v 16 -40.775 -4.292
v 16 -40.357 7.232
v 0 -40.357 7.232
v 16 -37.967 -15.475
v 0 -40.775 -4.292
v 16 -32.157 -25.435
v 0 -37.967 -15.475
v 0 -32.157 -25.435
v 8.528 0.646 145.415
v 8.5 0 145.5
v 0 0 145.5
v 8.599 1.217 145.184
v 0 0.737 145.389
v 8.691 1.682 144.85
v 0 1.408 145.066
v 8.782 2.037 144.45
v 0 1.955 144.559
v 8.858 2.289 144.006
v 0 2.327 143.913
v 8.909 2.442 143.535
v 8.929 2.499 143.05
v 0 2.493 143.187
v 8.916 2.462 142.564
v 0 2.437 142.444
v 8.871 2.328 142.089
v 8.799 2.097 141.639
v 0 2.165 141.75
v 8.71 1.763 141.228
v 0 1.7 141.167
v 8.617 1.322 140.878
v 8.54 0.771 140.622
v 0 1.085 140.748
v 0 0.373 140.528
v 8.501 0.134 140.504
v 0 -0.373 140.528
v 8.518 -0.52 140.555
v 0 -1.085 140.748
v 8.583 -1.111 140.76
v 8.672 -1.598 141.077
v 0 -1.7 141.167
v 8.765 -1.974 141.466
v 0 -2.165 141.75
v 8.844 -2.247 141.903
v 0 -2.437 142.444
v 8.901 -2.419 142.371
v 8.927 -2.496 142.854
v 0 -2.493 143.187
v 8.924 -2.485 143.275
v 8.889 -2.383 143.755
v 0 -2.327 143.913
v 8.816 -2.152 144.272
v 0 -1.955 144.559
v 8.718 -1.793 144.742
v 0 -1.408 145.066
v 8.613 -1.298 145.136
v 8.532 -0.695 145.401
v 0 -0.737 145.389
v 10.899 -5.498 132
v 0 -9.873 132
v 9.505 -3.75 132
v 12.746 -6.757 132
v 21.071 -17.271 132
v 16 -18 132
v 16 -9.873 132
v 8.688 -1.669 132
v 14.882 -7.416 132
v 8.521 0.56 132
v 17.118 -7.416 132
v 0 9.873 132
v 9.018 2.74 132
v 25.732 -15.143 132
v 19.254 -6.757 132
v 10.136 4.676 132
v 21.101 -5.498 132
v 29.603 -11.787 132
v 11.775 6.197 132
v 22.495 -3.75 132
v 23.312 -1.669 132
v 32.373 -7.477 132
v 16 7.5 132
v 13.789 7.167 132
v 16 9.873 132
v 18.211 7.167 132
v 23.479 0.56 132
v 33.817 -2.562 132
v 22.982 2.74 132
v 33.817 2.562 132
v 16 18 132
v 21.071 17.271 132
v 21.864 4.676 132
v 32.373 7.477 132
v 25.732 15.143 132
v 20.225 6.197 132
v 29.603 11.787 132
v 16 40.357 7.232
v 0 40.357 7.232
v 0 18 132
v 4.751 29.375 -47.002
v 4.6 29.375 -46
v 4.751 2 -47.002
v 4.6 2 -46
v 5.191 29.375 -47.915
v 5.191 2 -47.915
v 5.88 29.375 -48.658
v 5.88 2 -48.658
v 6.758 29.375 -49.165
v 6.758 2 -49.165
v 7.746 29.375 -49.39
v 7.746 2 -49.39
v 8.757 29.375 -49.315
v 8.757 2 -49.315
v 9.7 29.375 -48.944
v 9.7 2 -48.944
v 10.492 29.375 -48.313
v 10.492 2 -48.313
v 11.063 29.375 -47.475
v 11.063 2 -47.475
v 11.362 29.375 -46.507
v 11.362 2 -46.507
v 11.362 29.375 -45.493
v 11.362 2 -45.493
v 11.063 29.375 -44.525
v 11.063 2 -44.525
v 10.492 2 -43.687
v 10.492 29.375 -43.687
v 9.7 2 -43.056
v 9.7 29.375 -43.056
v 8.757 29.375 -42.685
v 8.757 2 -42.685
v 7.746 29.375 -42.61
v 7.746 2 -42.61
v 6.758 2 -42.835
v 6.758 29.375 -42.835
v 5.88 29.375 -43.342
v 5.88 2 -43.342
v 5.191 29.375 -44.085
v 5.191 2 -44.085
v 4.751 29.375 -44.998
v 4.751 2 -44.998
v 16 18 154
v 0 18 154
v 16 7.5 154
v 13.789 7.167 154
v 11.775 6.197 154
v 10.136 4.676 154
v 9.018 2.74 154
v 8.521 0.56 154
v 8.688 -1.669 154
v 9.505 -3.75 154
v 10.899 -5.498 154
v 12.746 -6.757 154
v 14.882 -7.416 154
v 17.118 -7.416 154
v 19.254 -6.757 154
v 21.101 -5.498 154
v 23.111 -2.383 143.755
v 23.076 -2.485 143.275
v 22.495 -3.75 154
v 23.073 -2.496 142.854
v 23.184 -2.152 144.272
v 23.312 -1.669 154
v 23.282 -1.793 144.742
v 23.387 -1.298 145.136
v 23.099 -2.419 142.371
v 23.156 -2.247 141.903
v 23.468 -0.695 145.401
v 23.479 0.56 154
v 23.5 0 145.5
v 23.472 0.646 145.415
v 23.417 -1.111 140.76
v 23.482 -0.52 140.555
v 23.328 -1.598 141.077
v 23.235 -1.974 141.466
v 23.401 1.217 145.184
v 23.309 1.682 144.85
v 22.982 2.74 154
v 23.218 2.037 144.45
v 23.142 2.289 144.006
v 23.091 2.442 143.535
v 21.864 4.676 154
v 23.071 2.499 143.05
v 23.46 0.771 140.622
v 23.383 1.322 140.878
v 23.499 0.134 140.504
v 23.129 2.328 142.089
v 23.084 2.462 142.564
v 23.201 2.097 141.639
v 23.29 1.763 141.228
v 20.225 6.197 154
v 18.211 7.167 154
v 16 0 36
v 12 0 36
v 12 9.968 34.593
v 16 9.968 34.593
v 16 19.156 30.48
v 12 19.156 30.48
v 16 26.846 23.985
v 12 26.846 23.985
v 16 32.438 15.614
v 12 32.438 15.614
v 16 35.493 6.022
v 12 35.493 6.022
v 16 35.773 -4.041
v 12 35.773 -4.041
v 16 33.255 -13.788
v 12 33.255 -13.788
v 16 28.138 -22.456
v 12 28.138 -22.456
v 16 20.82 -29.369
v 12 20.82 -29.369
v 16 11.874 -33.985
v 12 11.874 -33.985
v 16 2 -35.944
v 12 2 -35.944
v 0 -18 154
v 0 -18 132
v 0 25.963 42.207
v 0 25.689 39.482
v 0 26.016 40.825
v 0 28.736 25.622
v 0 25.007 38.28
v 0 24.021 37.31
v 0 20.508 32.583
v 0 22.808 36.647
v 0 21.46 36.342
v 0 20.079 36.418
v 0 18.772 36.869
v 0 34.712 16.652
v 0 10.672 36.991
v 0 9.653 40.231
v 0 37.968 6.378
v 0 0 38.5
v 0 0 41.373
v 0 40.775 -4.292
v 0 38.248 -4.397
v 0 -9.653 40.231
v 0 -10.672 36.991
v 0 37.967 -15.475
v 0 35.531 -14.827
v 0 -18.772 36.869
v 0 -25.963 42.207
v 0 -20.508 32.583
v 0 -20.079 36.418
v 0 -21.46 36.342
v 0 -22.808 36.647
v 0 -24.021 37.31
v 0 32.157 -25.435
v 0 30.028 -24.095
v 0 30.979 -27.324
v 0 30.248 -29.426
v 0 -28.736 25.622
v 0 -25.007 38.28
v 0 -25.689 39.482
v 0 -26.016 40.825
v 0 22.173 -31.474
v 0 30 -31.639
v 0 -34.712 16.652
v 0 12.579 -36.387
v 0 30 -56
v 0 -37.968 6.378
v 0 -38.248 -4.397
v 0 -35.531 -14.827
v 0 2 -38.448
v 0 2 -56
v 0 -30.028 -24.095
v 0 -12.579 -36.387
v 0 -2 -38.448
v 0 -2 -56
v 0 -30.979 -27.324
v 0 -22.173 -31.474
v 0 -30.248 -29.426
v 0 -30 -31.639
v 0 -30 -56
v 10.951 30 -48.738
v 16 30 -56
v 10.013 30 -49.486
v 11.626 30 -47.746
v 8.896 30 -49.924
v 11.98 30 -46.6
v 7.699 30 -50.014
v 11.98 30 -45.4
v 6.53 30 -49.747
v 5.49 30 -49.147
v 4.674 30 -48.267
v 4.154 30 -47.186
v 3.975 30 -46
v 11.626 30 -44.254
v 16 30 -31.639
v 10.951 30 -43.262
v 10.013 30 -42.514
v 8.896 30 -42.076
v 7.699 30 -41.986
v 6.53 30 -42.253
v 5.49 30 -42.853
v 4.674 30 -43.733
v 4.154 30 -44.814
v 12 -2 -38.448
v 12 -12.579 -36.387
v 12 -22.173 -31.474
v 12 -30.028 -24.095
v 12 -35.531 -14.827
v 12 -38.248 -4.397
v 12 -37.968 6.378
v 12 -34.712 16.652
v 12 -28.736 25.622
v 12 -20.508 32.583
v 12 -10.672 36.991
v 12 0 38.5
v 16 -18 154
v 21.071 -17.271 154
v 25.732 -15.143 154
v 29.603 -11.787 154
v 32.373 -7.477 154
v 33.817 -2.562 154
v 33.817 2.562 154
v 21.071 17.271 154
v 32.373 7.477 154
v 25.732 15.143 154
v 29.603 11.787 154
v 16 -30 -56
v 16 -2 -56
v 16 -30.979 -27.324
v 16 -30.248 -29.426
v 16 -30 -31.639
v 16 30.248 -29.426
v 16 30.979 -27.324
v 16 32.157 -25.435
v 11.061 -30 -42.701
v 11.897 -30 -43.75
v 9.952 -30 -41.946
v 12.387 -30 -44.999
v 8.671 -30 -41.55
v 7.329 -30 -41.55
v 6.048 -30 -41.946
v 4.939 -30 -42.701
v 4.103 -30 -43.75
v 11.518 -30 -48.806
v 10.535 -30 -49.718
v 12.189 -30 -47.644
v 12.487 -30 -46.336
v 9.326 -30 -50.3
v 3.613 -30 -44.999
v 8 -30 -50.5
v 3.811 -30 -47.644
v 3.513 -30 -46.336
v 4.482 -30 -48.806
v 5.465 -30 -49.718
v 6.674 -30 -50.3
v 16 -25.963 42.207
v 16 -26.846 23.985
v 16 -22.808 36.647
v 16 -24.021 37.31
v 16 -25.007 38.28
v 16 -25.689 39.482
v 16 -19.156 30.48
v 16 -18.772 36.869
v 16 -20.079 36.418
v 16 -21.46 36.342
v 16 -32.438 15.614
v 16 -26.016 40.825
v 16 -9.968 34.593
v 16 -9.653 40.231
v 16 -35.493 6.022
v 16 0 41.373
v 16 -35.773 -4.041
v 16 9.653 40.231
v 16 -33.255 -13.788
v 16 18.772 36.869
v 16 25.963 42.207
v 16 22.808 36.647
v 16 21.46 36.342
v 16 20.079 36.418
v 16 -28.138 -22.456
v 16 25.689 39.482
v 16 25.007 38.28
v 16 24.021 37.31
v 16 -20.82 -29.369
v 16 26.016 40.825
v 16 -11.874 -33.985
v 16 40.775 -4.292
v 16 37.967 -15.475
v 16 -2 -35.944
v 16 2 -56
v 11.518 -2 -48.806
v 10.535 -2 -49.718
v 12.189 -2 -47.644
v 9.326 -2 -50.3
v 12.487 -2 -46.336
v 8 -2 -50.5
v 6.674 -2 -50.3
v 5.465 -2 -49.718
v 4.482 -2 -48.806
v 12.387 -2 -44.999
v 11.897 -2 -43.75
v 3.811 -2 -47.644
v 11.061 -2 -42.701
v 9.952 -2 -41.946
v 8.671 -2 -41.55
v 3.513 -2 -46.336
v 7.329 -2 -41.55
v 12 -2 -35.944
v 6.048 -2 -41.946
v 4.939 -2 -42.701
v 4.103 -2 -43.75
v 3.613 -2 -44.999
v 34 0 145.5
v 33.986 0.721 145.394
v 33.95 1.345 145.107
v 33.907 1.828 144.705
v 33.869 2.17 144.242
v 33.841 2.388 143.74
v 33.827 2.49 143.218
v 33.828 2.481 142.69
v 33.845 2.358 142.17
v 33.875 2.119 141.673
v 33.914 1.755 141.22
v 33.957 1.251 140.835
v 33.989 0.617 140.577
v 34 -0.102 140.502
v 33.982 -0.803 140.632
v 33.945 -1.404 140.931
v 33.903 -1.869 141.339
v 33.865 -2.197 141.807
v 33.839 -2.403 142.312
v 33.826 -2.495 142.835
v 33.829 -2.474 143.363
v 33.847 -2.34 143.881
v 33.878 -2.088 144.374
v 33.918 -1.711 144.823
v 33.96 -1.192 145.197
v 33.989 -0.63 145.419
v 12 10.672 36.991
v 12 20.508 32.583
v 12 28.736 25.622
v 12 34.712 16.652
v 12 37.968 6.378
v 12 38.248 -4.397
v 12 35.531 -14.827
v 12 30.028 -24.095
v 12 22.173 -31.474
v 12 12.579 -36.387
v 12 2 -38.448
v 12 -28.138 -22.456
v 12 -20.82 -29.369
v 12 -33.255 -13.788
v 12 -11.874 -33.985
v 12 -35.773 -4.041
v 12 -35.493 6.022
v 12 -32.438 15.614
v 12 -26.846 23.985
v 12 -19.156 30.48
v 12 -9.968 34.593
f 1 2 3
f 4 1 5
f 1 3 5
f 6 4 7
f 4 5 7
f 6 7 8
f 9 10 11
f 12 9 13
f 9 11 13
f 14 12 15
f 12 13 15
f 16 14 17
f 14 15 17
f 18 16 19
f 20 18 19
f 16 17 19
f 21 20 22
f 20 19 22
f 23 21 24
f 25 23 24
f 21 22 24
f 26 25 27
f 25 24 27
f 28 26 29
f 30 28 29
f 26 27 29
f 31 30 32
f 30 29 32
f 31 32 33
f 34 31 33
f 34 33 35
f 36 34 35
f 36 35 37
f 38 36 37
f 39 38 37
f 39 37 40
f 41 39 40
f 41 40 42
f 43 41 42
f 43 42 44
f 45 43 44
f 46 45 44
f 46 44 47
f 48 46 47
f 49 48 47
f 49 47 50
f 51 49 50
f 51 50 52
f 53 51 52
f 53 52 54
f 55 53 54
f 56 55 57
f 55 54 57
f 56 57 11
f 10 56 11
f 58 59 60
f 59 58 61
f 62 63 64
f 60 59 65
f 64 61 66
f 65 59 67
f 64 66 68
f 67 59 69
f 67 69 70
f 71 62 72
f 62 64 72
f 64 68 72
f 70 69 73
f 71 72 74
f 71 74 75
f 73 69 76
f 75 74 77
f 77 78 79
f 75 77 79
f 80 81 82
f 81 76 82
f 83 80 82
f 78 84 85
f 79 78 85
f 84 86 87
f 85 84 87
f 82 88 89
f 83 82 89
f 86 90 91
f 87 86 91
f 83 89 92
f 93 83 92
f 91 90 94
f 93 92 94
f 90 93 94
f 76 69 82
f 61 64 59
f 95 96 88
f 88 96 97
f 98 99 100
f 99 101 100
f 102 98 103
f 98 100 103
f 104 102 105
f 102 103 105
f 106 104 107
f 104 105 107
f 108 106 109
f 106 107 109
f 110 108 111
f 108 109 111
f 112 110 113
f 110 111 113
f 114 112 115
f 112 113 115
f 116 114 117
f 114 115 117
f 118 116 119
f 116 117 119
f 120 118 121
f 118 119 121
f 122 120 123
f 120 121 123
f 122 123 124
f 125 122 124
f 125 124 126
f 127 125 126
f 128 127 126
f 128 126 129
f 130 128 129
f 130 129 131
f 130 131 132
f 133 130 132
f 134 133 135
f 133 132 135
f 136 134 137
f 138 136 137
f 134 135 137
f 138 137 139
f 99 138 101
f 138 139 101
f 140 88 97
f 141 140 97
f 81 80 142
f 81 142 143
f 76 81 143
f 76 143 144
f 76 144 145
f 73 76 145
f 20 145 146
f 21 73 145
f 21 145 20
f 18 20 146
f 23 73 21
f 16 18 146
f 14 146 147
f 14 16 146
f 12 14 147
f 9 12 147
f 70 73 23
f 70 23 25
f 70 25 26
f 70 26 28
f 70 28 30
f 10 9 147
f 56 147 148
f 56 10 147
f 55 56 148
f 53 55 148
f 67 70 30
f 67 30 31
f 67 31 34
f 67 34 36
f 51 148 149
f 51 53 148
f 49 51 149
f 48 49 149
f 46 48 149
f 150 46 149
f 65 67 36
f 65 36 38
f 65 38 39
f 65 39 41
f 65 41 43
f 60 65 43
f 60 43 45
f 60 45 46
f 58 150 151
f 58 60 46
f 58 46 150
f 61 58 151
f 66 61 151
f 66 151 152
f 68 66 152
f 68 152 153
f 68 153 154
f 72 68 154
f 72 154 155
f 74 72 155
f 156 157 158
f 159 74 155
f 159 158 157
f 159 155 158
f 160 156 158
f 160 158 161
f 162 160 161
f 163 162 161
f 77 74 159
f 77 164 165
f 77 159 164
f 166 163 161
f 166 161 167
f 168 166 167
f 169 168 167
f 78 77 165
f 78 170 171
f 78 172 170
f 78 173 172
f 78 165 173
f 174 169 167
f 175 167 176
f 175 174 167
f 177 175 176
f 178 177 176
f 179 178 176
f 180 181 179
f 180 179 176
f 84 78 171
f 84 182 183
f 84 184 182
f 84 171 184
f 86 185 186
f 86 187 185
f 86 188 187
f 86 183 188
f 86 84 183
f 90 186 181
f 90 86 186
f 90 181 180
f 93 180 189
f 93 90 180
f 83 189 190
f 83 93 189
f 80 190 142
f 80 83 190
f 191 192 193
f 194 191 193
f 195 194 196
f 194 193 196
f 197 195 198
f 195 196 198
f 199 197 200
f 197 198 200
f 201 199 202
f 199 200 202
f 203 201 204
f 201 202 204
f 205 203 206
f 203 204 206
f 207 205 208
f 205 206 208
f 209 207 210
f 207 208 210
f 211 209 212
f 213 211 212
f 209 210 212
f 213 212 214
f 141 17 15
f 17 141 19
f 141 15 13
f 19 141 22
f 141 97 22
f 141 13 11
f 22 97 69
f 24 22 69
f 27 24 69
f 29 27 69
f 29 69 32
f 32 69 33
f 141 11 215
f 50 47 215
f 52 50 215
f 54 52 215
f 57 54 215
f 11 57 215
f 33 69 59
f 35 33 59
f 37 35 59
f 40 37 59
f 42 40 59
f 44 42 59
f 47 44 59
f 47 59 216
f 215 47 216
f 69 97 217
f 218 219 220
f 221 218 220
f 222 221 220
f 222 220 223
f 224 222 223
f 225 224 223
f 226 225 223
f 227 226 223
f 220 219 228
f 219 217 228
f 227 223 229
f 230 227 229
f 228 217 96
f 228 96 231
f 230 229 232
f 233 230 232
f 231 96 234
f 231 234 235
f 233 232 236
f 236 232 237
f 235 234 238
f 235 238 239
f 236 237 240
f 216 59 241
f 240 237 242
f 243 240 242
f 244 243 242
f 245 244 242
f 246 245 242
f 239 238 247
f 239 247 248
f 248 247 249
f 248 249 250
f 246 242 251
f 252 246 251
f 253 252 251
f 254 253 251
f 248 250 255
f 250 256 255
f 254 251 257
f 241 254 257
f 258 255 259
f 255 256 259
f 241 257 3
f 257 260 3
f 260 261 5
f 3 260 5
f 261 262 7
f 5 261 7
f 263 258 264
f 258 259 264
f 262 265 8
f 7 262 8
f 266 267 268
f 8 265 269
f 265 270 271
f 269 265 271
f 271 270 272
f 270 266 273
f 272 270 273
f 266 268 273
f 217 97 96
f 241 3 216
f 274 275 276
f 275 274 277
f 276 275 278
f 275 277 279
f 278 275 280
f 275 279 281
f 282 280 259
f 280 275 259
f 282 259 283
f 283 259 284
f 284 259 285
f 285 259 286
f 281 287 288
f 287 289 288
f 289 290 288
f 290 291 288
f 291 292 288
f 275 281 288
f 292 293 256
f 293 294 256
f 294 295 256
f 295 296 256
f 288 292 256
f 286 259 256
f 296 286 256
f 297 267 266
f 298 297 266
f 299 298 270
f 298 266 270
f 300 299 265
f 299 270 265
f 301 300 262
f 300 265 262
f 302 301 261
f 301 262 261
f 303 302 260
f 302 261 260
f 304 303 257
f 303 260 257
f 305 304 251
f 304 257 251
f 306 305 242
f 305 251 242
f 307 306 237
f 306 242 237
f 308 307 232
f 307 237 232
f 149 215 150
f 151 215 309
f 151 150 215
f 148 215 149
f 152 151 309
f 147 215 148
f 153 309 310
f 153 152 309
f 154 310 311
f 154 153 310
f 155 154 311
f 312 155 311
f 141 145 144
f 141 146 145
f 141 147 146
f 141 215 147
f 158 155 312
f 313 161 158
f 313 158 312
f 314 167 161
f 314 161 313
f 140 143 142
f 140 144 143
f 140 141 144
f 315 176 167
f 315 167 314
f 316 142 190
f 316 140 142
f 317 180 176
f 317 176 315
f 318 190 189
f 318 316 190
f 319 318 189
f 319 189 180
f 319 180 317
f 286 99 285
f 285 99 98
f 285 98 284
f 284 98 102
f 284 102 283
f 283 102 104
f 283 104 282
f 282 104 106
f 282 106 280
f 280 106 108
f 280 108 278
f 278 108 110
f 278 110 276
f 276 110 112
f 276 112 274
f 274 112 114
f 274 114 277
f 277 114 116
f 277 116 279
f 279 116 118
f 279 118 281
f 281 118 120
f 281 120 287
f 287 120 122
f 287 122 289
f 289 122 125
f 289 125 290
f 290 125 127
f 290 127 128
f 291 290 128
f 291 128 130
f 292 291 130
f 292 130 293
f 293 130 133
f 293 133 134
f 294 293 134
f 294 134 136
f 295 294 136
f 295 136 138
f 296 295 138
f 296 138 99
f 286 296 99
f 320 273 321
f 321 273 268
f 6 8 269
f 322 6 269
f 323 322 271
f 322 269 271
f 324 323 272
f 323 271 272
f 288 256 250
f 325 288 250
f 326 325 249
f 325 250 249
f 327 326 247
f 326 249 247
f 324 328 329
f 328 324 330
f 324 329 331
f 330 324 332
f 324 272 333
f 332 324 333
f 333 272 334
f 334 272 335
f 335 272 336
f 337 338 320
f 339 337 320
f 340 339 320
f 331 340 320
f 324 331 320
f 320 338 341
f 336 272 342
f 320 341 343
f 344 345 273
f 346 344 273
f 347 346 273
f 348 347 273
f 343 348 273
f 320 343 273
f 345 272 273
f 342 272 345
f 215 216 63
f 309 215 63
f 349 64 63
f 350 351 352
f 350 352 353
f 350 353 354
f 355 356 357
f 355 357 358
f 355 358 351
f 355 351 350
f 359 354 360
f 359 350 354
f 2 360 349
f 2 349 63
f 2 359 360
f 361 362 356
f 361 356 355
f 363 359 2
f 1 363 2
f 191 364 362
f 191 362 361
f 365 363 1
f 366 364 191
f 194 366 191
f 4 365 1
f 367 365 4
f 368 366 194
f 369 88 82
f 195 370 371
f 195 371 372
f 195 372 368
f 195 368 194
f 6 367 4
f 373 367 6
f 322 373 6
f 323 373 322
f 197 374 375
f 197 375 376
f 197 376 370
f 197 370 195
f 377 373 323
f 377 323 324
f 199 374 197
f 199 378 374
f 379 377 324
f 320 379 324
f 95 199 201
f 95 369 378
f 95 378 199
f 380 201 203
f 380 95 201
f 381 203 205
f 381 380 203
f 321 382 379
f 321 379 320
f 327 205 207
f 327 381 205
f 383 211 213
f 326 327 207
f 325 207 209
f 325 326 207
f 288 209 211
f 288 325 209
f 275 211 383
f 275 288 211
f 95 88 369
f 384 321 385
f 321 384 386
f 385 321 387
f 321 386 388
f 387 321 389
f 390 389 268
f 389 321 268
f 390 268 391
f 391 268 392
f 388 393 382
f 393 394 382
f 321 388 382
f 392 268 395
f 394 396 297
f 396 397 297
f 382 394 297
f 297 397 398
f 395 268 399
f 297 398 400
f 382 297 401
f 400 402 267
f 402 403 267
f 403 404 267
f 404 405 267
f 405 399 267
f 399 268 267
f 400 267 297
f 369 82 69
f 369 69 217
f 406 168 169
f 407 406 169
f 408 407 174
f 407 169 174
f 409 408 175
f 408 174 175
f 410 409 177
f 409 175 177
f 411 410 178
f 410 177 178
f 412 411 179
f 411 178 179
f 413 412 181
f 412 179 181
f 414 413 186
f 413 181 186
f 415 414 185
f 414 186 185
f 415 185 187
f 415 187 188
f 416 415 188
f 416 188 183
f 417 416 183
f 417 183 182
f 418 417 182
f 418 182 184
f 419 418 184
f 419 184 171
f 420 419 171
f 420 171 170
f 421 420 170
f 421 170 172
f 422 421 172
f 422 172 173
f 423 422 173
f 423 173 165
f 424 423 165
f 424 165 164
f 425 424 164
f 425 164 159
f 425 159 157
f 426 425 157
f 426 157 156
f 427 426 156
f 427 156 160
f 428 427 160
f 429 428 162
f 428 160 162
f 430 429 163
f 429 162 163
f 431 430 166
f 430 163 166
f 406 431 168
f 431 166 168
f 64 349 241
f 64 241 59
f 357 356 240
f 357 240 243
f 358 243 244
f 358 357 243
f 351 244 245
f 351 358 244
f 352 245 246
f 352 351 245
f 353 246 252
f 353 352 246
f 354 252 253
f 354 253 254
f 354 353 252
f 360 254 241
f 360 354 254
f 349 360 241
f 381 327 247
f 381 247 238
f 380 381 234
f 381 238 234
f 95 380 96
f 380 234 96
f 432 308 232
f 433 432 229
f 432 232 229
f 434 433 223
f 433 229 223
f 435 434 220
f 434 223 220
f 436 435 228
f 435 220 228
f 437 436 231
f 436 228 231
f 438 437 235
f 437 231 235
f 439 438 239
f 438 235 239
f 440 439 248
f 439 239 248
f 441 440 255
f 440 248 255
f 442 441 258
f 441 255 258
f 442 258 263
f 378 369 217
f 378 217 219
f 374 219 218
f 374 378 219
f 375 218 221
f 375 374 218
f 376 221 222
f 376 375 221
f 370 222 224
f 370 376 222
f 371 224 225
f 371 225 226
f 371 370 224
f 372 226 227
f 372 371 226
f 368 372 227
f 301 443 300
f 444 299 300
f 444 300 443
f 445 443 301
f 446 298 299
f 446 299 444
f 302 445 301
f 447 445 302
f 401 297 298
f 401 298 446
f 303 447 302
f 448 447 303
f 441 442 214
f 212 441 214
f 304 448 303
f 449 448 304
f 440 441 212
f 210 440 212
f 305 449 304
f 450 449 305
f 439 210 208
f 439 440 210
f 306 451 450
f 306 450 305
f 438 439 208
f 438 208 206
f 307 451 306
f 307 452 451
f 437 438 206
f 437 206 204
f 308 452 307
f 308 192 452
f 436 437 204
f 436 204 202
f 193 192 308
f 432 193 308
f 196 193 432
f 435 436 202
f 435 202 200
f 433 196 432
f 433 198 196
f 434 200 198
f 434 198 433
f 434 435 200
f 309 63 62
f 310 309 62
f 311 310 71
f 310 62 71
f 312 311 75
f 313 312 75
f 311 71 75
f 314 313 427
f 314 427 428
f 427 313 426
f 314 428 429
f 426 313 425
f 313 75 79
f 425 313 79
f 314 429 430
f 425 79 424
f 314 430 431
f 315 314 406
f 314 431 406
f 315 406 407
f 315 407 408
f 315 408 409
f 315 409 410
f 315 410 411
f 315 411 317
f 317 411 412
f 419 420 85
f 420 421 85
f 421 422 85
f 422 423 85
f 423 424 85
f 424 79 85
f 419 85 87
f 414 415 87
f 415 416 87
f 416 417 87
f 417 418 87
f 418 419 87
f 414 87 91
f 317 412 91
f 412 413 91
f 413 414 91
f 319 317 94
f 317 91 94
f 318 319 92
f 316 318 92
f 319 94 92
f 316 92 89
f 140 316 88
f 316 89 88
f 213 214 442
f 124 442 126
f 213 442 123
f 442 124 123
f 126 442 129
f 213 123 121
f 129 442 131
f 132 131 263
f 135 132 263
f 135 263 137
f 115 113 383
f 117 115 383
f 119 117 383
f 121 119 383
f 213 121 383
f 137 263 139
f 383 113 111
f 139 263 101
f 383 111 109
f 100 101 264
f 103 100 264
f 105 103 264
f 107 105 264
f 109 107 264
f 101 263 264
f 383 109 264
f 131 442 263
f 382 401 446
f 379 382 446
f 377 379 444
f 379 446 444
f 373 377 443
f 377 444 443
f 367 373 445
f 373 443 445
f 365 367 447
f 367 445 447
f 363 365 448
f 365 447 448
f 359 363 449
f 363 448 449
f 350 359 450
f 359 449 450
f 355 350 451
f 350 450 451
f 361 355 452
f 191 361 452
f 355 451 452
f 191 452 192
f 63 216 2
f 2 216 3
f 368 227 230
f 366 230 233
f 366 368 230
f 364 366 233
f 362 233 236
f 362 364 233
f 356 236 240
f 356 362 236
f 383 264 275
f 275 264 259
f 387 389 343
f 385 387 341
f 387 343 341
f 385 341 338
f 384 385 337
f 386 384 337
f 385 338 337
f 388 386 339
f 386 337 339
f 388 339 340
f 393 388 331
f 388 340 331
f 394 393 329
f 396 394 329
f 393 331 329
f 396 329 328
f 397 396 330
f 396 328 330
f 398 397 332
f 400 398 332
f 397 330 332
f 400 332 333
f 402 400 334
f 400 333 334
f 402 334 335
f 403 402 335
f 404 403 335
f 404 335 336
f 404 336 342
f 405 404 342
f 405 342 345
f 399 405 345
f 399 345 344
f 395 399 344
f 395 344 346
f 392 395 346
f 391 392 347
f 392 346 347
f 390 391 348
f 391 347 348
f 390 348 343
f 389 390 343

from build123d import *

# Parameters (mm, degrees)
EXTRUDE_1_DEPTH              = 16
SKETCH_3_R                   = 7.5
EXTRUDE_2_DEPTH              = 22
SKETCH_4_R                   = 38.5
CUT_EXTRUDE_1_DEPTH          = 12
CUT_EXTRUDE_2_DEPTH          = 16
CUT_EXTRUDE_3_REACH          = 164.951
CUT_EXTRUDE_3_END_RADIUS     = 18
SKETCH_6_R                   = 2.5
SKETCH_7_R                   = 4.5
CUT_EXTRUDE_4_DEPTH          = 28
HOLE_WIZARD_M8_1_D           = 6.8
HOLE_WIZARD_M8_1_CSINK_D     = 8.05
HOLE_WIZARD_M8_1_CSINK_ANGLE = 90


with BuildPart() as part:
    # 草图1 → 凸台-拉伸1 (new body)
    with BuildSketch(Plane(origin=(0, 0, 0), x_dir=(0, 0, -1), z_dir=(1, 0, 0))):
        with BuildLine():
            Line((-132, 0), (-36, 0))
            ThreePointArc((-36, 0), (-1.000386324, 35.986097693), (35.944401511, 2))
            Line((35.944401511, 2), (56, 2))
            Line((56, 2), (56, 30))
            Line((56, 30), (31.638584039, 30))
            ThreePointArc((31.638584039, 30), (28.354636152, 30.554594436), (25.43494011, 32.156862745))
            ThreePointArc((25.43494011, 32.156862745), (9.982578161, 39.766168199), (-7.231593148, 40.357205807))
            Line((-7.231593148, 40.357205807), (-132, 18))
            Line((-132, 18), (-132, 0))
        make_face()
        with BuildLine():
            ThreePointArc((35.944401511, -2), (-1.000386324, -35.986097693), (-36, 0))
            Line((-36, 0), (-132, 0))
            Line((-132, 0), (-132, -18))
            Line((-132, -18), (-7.231593148, -40.357205807))
            ThreePointArc((-7.231593148, -40.357205807), (9.982578161, -39.766168199), (25.43494011, -32.156862745))
            ThreePointArc((25.43494011, -32.156862745), (28.354636152, -30.554594436), (31.638584039, -30))
            Line((31.638584039, -30), (56, -30))
            Line((56, -30), (56, -2))
            Line((56, -2), (35.944401511, -2))
        make_face()
    extrude(amount=EXTRUDE_1_DEPTH)

    # 草图3 → 凸台-拉伸2 (add)
    with BuildSketch(Plane.XY.offset(132)):
        with BuildLine():
            Line((16, 18), (0, 18))
            Line((0, 18), (0, -18))
            Line((0, -18), (16, -18))
            ThreePointArc((16, -18), (34, 0), (16, 18))
        make_face()
        with Locations(Location((16, 0, 0), (0, 0, 90))):
            Circle(SKETCH_3_R, mode=Mode.SUBTRACT)
    extrude(amount=EXTRUDE_2_DEPTH)

    # 草图4 → 切除-拉伸1 (cut)
    with BuildSketch(Plane.ZY):
        Circle(SKETCH_4_R)
    extrude(amount=-CUT_EXTRUDE_1_DEPTH, mode=Mode.SUBTRACT)

    # 草图5 → 切除-拉伸2 (cut)
    with BuildSketch(Plane(origin=(16, 0, 0), x_dir=(0, 0, -1), z_dir=(1, 0, 0))):
        with BuildLine():
            Line((-132, -9.872579049), (-132, 9.872579049))
            Line((-132, 9.872579049), (-42.206623977, 25.962621701))
            ThreePointArc((-42.206623977, 25.962621701), (-37.309997522, 24.021277058), (-36.869036306, 18.772341655))
            ThreePointArc((-36.869036306, 18.772341655), (-41.373018374, 0), (-36.869036306, -18.772341655))
            ThreePointArc((-36.869036306, -18.772341655), (-37.309997522, -24.021277058), (-42.206623977, -25.962621701))
            Line((-42.206623977, -25.962621701), (-132, -9.872579049))
        make_face()
    extrude(amount=-CUT_EXTRUDE_2_DEPTH, mode=Mode.SUBTRACT)

    # 切除-拉伸3: up to this cylinder (the profile starts inside it)
    cut_extrude_3_end = Plane(origin=(16, 0, 143), z_dir=(0, 0, -1)) * Cylinder(CUT_EXTRUDE_3_END_RADIUS, 366.902, mode=Mode.PRIVATE)
    # 草图6 → 切除-拉伸3 (cut, up to the surface)
    with BuildSketch(Plane.ZY, mode=Mode.PRIVATE) as cut_extrude_3_sk1:
        with Locations((143, 0)):
            Circle(SKETCH_6_R)
    cut_extrude_3_tool1 = extrude(cut_extrude_3_sk1.sketch, amount=-CUT_EXTRUDE_3_REACH, mode=Mode.PRIVATE) & cut_extrude_3_end
    add(cut_extrude_3_tool1.solids().sort_by_distance((0, 0, 143))[0], mode=Mode.SUBTRACT)

    # 草图7 → 切除-拉伸4 (cut)
    with BuildSketch(Plane.XZ.offset(30)):
        with Locations(Location((8, -46, 0), (0, 0, 270))):
            Circle(SKETCH_7_R)
    extrude(amount=-CUT_EXTRUDE_4_DEPTH, mode=Mode.SUBTRACT)

    # M8 螺纹孔1 (through all)
    with Locations(Plane(origin=(0, 30, 0), x_dir=(1, 0, 0), z_dir=(0, 1, 0))):
        with Locations((8, 46)):
            CounterSinkHole(HOLE_WIZARD_M8_1_D / 2, HOLE_WIZARD_M8_1_CSINK_D / 2, counter_sink_angle=HOLE_WIZARD_M8_1_CSINK_ANGLE)


solid = part.part
